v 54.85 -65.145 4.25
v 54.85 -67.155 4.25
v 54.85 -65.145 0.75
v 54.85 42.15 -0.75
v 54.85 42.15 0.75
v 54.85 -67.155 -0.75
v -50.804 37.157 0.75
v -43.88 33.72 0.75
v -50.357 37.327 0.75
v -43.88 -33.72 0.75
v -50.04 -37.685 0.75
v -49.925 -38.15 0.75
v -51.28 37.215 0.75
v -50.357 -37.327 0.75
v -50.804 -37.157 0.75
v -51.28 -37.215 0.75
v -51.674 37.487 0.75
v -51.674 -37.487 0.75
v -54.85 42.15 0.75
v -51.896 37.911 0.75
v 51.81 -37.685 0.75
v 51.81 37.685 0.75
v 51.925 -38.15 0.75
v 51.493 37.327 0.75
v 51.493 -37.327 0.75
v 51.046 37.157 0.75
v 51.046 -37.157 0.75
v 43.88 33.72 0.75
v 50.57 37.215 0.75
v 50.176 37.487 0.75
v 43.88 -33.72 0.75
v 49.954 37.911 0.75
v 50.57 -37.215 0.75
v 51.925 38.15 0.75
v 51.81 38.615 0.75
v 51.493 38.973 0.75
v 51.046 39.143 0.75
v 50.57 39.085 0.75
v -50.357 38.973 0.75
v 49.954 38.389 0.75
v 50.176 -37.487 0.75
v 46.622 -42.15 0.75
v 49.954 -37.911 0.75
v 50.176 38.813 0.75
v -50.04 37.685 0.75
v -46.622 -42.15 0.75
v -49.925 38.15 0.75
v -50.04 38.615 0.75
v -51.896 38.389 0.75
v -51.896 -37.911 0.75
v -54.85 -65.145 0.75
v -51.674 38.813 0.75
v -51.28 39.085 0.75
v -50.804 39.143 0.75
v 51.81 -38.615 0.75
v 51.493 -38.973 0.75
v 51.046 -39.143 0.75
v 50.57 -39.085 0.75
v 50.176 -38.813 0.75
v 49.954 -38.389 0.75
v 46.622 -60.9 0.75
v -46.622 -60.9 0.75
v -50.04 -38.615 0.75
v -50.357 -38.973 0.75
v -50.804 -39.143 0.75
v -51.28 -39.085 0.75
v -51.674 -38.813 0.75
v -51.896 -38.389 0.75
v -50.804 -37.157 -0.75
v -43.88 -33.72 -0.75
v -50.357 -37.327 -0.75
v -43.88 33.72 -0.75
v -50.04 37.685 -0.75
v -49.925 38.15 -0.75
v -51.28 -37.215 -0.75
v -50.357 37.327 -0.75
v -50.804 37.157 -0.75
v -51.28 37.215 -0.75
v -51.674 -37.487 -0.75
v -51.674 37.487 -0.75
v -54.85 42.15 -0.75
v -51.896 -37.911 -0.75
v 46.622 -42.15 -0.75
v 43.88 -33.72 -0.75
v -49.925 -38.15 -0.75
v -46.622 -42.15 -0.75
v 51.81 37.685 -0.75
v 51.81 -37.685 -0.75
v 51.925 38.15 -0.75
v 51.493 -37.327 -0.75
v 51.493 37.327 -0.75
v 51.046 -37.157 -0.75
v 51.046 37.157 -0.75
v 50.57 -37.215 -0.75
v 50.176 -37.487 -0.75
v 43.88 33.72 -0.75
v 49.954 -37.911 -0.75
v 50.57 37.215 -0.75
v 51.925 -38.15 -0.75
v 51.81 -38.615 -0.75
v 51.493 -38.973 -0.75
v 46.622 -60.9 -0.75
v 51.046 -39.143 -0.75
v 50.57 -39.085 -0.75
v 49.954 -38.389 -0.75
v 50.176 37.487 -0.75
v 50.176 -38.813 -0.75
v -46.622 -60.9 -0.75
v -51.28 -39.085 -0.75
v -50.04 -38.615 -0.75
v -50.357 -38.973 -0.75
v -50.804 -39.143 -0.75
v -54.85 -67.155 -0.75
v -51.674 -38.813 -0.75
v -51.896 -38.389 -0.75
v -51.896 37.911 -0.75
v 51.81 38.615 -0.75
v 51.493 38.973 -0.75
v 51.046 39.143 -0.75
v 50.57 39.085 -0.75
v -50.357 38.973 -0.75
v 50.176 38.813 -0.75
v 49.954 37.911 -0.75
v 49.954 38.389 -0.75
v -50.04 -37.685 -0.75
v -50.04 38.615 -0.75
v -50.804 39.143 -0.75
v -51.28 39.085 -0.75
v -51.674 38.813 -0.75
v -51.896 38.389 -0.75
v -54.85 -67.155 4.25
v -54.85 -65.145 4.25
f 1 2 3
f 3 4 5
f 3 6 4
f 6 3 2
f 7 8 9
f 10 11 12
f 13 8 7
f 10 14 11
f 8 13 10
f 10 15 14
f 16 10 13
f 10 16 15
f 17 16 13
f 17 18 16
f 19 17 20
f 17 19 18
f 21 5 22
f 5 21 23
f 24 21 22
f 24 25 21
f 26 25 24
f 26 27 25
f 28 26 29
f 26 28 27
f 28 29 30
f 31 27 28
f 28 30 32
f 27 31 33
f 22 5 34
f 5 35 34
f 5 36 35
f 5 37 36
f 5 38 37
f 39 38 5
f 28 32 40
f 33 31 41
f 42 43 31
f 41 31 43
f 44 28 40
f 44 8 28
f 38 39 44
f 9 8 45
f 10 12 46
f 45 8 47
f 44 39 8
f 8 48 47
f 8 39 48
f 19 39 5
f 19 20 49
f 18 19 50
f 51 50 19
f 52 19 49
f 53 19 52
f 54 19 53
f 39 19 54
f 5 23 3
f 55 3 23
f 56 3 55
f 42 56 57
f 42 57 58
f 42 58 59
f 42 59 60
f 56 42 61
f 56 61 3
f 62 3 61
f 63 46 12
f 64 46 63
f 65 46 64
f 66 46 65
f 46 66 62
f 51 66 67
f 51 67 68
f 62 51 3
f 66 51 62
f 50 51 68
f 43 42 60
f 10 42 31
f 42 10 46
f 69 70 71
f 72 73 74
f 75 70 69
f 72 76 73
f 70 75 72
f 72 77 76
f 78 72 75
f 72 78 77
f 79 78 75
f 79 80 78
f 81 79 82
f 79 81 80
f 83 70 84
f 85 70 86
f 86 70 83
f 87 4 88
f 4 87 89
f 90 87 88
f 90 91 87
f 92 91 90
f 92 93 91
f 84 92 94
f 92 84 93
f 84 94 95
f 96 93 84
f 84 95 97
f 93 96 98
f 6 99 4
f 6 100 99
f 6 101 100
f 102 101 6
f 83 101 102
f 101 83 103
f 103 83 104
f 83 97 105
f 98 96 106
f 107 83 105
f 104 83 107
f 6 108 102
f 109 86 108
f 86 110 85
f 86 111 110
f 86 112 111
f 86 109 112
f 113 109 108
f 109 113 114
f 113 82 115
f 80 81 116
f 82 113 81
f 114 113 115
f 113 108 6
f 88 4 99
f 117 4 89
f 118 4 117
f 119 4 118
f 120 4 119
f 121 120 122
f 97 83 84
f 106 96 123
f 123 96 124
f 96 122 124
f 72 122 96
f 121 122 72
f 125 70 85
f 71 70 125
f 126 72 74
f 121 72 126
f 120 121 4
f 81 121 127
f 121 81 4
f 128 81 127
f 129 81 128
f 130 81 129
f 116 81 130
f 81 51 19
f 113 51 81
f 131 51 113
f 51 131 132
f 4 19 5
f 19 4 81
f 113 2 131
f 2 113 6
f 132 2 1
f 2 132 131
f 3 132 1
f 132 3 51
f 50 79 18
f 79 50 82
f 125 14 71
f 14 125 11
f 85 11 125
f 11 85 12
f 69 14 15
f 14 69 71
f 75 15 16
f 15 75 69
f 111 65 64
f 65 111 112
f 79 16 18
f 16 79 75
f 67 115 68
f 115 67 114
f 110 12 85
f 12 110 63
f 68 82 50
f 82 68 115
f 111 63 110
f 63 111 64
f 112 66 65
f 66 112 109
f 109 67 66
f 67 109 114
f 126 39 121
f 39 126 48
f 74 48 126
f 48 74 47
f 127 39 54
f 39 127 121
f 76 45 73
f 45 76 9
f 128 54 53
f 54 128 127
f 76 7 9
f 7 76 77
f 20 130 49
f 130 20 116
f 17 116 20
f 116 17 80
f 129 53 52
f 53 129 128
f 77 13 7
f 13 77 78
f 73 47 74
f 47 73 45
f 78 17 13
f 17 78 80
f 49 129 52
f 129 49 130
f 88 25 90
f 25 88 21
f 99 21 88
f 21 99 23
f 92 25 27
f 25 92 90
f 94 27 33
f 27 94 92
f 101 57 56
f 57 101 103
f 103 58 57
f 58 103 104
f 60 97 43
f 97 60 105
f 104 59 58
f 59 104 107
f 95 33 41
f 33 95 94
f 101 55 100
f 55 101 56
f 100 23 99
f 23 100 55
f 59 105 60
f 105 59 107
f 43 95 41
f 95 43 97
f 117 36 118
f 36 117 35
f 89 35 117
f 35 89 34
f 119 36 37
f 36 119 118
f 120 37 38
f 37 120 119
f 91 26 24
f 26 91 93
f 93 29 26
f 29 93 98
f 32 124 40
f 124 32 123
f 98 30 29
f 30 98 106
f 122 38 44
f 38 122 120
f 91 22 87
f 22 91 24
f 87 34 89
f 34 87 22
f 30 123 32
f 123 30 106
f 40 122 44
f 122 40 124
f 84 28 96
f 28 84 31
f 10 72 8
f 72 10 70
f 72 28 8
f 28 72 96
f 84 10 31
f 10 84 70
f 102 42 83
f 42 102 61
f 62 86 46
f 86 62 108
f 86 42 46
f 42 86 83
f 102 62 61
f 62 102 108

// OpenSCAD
// A drilling jig for the BTT SKR3 board with Creality Sermoon D1.
// This is now superflows since I needed an adapter tp mount the SKR3 with 90°.
// Kept in case it migh be a good start for other pronters.
// Copyright (C) 2023 Dieter Fauth
// This program is free software: you can redistribute it and/or modify it under the terms of the GNU General Public License as published by the Free Software Foundation, either version 3 of the License, or (at your option) any later version.
// This program is distributed in the hope that it will be useful, but WITHOUT ANY WARRANTY; without even the implied warranty of MERCHANTABILITY or FITNESS FOR A PARTICULAR PURPOSE. See the GNU General Public License for more details. You should have received a copy of the GNU General Public License along with this program. If not, see <http://www.gnu.org/licenses/>.
// Contact: dieter.fauth at web.de

/* [Print] */

PrintThis = "all"; // ["all", "mount"]

/* [Sizes] */
BoardLenght=109.7;
BoardWidth=84.3;

DrillLenght=101.85;
DrillWidth=76.3;
DrillDiameter=2;

MountDistance=25;
Thickness=1.5;

/* [Misc] */

/* [Hidden] */

module __Customizer_Limit__ () {}
    shown_by_customizer = false;

$fa = $preview ? 2 : 0.5;
$fs = $preview ? 1 : 0.5;

// If you enable the next line, the $fa and $fs are ignored.
// $fn = $preview ? 12 : 100;
Epsilon = 0.01;
epsilon = Epsilon;

module Jig()
{
   difference()
   {
      union()
      {
         cube([BoardLenght, BoardWidth, Thickness], center=true);
         translate([0,-BoardWidth/2-MountDistance/2,0])
            cube([BoardLenght, MountDistance+Epsilon, Thickness], center=true);
         // Stopper
         stopper_width=2;
         stopper_height=5;
         translate([0,-BoardWidth/2-MountDistance+stopper_width/2,stopper_height/2-Thickness/2])
            cube([BoardLenght, stopper_width+Epsilon, stopper_height], center=true);
      }
      for(x=[-1,1])
      {
         for(y=[-1,1])
         {
            translate([x*DrillLenght/2, y*DrillWidth/2, 0])
               cylinder(d=DrillDiameter, h=5*Thickness, center=true);
         }
      }
      translate([0, 0, 0])
         cube([0.8*BoardLenght, 0.8*BoardWidth, 5*Thickness], center=true);
      translate([0, -0.75*MountDistance/2-BoardWidth/2, 0])
         cube([0.85*BoardLenght, 0.75*MountDistance, 5*Thickness], center=true);
   }
}

module print(what="all")
{
   if(what == "all")
   {
      Jig();
   }
}

print(PrintThis);
